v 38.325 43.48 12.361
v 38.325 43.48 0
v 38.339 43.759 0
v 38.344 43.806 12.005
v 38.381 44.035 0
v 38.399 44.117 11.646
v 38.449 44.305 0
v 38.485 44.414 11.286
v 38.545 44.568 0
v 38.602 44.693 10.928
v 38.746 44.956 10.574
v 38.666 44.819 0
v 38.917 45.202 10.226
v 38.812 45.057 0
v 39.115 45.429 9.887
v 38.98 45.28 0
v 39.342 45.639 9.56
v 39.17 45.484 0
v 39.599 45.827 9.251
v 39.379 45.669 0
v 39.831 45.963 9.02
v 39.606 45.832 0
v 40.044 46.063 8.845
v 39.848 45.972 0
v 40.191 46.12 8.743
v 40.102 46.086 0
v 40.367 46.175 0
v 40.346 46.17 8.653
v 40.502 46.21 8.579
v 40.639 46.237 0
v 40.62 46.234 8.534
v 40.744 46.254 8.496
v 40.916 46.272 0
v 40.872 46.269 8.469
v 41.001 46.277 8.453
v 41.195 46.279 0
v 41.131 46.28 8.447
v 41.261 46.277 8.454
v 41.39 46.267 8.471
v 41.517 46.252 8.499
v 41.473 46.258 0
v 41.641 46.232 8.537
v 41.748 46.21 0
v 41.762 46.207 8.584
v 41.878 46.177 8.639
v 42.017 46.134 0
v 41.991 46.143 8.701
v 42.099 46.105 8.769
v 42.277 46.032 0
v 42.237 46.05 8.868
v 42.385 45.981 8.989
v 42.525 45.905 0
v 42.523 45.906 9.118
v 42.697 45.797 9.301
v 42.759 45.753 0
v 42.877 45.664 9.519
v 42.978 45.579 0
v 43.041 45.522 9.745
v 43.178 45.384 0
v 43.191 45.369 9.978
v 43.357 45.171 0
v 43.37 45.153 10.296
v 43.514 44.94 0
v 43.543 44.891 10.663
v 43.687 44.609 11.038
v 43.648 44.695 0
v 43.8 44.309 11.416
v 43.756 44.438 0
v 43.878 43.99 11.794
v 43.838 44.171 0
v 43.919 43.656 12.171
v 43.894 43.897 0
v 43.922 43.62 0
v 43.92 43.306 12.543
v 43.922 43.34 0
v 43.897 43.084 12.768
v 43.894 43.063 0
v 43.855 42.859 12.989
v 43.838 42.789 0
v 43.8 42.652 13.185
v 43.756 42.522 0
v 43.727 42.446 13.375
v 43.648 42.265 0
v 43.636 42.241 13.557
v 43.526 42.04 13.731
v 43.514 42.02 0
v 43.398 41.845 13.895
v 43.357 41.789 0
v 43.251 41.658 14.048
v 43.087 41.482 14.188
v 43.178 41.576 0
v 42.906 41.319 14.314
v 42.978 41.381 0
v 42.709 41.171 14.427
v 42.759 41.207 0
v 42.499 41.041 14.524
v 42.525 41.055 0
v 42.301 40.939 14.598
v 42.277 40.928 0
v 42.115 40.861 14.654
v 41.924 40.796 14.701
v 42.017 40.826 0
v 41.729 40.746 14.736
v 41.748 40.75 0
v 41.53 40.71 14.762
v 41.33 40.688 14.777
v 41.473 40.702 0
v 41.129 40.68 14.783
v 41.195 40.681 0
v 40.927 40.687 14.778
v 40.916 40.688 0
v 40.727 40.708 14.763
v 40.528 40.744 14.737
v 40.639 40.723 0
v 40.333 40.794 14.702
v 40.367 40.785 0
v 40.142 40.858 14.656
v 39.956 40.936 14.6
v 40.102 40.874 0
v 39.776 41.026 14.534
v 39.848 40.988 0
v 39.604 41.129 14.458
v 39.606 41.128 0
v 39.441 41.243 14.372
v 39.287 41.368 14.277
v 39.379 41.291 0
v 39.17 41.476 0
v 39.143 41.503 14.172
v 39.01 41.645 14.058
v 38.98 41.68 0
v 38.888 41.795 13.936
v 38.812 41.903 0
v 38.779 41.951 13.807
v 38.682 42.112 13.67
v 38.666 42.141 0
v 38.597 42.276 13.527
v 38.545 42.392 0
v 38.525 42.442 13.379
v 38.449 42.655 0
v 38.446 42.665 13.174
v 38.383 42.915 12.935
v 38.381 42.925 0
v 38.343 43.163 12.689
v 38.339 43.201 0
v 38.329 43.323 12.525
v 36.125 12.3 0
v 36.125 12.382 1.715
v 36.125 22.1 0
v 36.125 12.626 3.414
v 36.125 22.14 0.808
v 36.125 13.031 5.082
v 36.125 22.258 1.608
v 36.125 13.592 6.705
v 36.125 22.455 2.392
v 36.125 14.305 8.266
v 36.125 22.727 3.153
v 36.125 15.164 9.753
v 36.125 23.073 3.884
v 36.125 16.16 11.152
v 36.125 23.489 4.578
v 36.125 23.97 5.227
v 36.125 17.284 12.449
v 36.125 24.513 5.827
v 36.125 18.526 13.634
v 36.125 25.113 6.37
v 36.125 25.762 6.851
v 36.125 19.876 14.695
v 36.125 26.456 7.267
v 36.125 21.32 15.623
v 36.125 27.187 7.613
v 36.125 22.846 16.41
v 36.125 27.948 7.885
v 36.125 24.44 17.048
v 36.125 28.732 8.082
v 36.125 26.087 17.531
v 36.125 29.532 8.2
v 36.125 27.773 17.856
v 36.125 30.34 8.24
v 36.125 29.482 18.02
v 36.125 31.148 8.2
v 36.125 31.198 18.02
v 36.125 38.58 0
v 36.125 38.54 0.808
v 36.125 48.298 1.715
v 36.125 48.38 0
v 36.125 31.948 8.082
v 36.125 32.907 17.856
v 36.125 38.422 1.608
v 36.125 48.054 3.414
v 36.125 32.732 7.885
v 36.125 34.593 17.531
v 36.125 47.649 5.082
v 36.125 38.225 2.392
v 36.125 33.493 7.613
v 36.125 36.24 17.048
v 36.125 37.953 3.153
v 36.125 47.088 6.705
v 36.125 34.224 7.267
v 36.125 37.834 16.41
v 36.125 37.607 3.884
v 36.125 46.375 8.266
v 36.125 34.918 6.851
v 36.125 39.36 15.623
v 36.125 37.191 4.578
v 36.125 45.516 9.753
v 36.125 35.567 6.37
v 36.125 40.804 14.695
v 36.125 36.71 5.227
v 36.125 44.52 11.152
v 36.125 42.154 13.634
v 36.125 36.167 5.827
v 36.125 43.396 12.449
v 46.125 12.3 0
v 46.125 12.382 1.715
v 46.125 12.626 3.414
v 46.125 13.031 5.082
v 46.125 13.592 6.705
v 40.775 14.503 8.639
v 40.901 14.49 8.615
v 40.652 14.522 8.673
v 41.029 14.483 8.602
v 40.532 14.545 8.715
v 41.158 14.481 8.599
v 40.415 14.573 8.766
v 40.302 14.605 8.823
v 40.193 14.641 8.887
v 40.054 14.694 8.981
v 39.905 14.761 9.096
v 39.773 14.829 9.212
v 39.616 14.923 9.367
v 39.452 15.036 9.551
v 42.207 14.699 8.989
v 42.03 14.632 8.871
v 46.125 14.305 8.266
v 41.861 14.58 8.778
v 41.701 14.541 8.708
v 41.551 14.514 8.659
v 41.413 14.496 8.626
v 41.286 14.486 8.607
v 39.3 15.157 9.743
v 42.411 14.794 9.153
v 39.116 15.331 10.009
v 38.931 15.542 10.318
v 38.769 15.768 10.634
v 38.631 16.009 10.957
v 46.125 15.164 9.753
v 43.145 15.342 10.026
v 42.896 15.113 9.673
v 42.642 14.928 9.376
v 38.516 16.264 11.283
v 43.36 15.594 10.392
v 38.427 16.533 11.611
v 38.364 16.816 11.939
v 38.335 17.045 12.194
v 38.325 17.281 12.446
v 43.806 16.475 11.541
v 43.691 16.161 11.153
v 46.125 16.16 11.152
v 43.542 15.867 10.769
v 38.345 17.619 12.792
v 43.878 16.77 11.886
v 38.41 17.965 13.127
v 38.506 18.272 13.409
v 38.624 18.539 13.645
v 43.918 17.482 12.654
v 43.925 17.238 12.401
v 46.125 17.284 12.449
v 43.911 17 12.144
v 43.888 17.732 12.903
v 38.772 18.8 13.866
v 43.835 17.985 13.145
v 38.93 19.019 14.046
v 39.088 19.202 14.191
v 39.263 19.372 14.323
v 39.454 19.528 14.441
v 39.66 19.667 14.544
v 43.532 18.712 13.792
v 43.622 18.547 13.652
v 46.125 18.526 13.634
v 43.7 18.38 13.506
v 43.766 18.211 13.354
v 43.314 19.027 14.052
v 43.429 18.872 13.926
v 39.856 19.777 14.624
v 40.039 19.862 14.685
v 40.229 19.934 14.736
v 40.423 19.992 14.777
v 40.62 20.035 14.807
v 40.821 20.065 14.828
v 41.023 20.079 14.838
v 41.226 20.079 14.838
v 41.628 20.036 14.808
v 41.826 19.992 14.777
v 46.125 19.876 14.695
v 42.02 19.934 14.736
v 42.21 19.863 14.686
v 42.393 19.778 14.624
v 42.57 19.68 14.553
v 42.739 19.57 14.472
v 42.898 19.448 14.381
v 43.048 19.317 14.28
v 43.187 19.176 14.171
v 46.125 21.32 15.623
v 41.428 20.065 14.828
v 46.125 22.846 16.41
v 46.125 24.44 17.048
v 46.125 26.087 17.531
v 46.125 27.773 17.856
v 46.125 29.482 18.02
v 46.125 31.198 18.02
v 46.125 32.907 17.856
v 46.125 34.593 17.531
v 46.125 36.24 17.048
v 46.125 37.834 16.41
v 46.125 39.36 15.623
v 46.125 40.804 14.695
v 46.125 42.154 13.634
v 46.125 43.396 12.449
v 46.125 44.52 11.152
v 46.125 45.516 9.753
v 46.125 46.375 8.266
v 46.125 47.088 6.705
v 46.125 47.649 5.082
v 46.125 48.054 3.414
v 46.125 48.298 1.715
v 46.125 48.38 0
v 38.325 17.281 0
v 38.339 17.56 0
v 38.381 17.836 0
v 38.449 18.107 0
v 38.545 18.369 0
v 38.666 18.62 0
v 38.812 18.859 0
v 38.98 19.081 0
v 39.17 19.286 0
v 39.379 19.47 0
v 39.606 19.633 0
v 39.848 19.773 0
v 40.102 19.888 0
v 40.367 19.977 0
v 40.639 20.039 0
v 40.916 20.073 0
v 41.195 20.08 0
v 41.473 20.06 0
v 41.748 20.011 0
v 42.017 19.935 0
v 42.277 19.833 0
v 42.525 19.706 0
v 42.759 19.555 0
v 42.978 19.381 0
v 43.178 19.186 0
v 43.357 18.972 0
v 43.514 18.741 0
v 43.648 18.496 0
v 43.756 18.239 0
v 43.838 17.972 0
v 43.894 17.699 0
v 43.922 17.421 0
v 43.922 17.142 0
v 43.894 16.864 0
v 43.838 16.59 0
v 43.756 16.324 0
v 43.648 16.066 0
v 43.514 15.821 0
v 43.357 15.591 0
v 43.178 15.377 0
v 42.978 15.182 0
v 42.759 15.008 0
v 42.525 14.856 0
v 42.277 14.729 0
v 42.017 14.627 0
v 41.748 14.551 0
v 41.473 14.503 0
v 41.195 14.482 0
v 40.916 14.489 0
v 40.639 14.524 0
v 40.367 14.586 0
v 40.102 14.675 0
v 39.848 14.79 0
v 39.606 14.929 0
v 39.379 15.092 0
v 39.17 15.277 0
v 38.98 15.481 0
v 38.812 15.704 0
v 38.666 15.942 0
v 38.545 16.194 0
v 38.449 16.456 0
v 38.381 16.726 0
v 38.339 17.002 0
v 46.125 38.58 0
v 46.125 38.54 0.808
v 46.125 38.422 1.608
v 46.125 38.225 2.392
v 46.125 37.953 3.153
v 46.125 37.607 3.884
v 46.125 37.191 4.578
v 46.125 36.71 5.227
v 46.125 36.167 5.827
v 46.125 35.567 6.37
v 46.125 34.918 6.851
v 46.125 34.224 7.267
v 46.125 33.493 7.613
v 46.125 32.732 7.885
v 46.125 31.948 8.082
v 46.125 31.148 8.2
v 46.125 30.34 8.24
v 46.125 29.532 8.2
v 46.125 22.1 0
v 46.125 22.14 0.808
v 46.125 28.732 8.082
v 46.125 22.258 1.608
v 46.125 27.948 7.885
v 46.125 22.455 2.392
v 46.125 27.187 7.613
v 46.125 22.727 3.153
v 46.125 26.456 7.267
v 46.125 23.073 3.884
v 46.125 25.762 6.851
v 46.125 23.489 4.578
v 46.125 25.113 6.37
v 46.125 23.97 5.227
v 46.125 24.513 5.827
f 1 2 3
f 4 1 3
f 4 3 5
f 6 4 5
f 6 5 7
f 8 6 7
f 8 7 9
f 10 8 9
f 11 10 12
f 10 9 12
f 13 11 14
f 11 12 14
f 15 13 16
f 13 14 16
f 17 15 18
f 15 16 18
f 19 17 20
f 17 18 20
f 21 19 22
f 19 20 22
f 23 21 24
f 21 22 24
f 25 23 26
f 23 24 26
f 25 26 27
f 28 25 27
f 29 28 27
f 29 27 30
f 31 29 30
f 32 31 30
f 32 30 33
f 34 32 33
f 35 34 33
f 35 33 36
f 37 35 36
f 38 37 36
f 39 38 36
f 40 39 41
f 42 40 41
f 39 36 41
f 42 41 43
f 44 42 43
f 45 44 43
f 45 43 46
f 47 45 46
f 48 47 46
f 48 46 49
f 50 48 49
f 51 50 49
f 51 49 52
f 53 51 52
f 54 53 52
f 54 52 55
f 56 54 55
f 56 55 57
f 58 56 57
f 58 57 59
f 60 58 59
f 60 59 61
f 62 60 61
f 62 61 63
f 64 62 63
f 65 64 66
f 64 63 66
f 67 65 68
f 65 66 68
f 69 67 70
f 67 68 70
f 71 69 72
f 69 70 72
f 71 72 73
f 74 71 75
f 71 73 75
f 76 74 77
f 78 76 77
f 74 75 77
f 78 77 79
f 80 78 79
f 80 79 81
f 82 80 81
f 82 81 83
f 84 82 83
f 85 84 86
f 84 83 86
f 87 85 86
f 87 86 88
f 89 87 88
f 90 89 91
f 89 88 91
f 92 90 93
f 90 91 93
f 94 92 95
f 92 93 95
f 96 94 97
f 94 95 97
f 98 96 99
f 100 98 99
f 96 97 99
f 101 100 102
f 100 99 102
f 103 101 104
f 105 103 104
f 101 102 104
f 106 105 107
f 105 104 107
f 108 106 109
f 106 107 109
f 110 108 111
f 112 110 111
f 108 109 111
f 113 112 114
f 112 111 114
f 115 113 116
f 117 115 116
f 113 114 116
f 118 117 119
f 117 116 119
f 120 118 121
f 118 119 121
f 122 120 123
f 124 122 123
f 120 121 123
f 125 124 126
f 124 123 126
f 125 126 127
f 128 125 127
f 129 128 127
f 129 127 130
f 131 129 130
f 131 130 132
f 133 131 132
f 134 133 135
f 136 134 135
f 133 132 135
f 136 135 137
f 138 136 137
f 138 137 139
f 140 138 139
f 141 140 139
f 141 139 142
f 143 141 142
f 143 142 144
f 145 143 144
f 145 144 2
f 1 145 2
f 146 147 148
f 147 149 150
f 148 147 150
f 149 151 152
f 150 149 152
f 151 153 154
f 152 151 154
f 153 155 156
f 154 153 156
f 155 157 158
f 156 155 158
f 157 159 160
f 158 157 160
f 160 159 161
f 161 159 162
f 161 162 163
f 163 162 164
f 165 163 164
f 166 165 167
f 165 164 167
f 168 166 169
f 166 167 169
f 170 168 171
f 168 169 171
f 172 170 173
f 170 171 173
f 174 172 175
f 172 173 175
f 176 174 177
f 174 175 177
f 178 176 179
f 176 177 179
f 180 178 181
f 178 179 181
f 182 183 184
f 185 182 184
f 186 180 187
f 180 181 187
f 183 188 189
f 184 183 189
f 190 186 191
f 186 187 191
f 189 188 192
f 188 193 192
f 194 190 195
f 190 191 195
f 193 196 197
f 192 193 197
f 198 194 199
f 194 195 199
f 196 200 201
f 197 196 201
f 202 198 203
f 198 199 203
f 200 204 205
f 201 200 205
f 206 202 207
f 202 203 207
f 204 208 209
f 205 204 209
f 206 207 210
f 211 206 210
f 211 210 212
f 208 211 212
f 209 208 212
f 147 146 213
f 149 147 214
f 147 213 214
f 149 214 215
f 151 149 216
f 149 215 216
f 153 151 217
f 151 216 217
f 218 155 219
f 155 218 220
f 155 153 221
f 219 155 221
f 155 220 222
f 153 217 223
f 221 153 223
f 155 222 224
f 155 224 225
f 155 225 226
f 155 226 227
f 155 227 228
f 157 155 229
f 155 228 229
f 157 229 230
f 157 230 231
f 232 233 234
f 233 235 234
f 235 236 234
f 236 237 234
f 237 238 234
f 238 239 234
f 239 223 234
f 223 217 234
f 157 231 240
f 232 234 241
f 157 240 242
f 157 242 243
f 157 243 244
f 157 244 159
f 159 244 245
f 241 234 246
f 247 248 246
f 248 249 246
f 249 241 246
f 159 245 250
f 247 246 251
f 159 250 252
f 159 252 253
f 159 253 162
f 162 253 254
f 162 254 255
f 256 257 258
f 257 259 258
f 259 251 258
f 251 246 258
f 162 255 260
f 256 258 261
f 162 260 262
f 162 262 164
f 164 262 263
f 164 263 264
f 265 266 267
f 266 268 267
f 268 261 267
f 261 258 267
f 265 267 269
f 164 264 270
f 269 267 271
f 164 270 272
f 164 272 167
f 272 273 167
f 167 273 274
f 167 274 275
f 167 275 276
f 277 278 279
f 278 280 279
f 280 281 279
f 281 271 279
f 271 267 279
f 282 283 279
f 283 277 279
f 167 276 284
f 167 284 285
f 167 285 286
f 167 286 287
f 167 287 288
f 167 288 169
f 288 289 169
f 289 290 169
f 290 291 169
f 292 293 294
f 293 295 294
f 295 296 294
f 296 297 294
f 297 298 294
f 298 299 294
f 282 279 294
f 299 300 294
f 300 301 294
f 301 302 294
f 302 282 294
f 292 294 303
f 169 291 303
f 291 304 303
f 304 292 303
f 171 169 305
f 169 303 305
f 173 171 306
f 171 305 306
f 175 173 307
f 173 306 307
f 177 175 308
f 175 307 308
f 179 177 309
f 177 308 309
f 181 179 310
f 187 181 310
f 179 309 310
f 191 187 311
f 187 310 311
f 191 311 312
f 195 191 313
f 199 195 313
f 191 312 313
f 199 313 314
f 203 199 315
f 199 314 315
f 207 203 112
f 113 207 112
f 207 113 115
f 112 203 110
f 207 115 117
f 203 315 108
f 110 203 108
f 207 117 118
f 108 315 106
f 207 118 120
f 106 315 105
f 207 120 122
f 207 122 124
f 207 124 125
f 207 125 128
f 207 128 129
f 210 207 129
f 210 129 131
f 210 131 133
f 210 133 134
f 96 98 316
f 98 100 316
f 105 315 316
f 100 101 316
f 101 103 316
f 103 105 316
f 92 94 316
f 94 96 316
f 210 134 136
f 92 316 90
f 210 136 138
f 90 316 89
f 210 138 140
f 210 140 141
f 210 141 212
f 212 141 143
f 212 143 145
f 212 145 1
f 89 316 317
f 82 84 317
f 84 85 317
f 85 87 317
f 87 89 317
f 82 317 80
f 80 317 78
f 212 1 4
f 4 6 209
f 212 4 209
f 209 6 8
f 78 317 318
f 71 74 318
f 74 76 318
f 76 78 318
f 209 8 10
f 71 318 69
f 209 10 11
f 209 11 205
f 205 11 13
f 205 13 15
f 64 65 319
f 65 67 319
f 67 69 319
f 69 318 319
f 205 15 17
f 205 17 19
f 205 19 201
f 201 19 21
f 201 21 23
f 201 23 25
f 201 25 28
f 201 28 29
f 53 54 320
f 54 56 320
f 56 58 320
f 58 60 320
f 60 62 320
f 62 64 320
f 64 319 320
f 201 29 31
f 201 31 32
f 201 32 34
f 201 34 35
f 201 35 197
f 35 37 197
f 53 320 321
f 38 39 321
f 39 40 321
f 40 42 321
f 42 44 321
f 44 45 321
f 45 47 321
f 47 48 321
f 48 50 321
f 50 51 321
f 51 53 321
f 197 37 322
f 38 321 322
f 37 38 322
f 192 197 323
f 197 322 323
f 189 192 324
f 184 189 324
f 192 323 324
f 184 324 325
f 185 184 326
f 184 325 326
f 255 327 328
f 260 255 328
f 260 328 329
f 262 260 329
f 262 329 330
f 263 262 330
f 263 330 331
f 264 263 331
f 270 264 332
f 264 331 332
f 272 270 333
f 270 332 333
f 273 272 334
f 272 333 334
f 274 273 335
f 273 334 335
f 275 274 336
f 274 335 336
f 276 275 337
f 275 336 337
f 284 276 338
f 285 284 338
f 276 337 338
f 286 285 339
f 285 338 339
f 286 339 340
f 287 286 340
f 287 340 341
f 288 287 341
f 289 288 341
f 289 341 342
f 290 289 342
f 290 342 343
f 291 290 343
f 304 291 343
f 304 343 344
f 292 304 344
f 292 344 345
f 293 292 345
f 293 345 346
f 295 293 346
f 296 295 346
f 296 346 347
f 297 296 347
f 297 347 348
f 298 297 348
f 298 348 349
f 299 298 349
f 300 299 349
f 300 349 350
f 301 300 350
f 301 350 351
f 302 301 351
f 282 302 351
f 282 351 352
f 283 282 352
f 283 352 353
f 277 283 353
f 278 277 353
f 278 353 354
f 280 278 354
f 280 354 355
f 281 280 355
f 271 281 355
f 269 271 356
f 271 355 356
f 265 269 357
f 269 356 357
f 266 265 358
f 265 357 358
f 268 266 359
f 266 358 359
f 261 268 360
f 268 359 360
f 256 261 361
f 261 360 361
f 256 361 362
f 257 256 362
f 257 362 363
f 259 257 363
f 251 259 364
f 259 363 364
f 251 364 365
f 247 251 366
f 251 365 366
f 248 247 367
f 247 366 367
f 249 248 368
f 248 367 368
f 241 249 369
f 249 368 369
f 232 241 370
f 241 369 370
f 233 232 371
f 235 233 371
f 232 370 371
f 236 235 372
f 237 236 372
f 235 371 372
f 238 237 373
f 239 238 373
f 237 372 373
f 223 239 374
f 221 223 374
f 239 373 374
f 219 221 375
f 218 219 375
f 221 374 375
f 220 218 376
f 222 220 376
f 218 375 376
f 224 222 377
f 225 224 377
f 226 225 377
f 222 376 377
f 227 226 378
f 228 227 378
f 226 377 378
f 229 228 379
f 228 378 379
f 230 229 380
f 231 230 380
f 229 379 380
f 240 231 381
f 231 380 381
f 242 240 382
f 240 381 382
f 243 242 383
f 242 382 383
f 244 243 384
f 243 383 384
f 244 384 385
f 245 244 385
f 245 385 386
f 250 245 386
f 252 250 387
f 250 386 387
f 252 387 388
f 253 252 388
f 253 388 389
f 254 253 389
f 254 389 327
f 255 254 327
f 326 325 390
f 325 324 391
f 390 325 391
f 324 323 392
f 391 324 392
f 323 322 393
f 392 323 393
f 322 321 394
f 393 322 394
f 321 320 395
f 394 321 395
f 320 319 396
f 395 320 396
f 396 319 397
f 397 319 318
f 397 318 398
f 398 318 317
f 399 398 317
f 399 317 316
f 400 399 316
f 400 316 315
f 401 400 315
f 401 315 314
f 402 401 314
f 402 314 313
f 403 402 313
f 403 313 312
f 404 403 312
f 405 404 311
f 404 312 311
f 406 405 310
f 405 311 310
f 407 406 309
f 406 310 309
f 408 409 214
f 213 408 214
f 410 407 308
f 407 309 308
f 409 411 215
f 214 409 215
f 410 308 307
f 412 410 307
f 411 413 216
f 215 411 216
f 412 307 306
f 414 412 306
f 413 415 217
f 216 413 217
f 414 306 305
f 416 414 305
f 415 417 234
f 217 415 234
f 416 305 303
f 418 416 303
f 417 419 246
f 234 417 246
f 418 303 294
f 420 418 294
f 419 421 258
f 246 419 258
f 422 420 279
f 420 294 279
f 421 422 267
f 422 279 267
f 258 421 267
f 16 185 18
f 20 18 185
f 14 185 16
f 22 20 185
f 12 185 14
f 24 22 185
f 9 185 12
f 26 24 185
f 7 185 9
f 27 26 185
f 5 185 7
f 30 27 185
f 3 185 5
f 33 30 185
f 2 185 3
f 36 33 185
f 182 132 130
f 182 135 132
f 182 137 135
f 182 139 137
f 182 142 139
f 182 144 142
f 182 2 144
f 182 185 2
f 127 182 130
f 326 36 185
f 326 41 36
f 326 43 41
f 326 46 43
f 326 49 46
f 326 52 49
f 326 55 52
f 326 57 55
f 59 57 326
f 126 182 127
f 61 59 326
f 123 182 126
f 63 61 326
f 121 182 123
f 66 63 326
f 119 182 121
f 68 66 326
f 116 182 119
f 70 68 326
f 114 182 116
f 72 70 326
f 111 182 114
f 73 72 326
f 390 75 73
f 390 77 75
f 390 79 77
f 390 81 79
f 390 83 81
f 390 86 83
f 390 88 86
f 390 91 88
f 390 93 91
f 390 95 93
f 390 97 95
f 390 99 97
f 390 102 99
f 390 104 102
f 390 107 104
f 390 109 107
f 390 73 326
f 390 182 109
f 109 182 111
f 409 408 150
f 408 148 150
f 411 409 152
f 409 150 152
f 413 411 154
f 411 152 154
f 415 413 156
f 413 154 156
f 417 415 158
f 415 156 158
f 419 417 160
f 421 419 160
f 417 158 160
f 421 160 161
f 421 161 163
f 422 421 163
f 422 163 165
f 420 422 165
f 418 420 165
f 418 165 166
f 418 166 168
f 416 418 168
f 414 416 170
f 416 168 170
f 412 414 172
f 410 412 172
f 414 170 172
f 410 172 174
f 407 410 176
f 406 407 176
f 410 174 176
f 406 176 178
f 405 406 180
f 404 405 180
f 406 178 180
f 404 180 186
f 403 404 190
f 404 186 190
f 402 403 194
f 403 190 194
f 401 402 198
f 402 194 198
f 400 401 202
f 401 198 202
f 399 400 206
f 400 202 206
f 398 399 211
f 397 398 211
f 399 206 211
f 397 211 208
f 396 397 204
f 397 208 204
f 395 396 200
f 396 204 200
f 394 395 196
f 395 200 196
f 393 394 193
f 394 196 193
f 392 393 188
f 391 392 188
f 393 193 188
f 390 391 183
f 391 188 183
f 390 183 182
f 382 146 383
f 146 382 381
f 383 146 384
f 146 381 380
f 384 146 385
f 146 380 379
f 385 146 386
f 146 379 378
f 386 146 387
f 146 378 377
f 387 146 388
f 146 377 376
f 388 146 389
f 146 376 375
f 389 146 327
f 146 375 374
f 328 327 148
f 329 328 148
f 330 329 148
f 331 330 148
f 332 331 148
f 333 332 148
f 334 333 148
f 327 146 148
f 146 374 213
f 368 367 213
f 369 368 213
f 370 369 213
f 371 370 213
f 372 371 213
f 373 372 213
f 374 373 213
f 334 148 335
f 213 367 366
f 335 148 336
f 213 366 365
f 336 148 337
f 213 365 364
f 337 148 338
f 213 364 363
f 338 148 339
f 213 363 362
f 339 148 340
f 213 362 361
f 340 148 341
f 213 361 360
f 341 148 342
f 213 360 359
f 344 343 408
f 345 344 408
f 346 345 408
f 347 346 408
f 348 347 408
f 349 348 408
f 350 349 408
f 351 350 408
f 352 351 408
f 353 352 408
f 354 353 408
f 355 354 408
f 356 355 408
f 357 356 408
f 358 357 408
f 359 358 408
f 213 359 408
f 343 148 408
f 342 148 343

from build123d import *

# Parameters (mm, degrees)
REVOLVE1_ANGLE          = 180
CUT_EXTRUDE1_REACH      = 71.236
CUT_EXTRUDE1_END_RADIUS = 18.04
SKETCH2_R               = 2.8


with BuildPart() as part:
    # Sketch1 → Revolve1 (revolve)
    with BuildSketch(Plane.XY):
        Polygon((40.76425, 22.1), (36.125, 22.1), (36.125, 12.3), (46.125, 12.3), (46.125, 22.1), align=None)
    revolve(axis=Axis((53.3, 30.34, 0), (-1, 0, 0)), revolution_arc=REVOLVE1_ANGLE)

    # Cut-Extrude1: up to this cylinder (the profile starts inside it)
    cut_extrude1_end = Plane(origin=(41.125, 30.34, 0), z_dir=(1, 0, 0)) * Cylinder(CUT_EXTRUDE1_END_RADIUS, 179.552, mode=Mode.PRIVATE)
    # Sketch2 → Cut-Extrude1 (cut, up to the surface)
    with BuildSketch(Plane(origin=(0, 0, 0), x_dir=(-1, 0, 0), z_dir=(0, 0, -1)), mode=Mode.PRIVATE) as cut_extrude1_sk1:
        with Locations((-41.125, 43.48)):
            Circle(SKETCH2_R)
    cut_extrude1_tool1 = extrude(cut_extrude1_sk1.sketch, amount=-CUT_EXTRUDE1_REACH, mode=Mode.PRIVATE) & cut_extrude1_end
    add(cut_extrude1_tool1.solids().sort_by_distance((41.125, 43.48, 0))[0], mode=Mode.SUBTRACT)
    # Sketch2 → Cut-Extrude1 (cut, up to the surface)
    with BuildSketch(Plane(origin=(0, 0, 0), x_dir=(-1, 0, 0), z_dir=(0, 0, -1)), mode=Mode.PRIVATE) as cut_extrude1_sk2:
        with Locations((-41.125, 17.281263544)):
            Circle(SKETCH2_R)
    cut_extrude1_tool2 = extrude(cut_extrude1_sk2.sketch, amount=-CUT_EXTRUDE1_REACH, mode=Mode.PRIVATE) & cut_extrude1_end
    add(cut_extrude1_tool2.solids().sort_by_distance((41.125, 17.281264, 0))[0], mode=Mode.SUBTRACT)


solid = part.part
